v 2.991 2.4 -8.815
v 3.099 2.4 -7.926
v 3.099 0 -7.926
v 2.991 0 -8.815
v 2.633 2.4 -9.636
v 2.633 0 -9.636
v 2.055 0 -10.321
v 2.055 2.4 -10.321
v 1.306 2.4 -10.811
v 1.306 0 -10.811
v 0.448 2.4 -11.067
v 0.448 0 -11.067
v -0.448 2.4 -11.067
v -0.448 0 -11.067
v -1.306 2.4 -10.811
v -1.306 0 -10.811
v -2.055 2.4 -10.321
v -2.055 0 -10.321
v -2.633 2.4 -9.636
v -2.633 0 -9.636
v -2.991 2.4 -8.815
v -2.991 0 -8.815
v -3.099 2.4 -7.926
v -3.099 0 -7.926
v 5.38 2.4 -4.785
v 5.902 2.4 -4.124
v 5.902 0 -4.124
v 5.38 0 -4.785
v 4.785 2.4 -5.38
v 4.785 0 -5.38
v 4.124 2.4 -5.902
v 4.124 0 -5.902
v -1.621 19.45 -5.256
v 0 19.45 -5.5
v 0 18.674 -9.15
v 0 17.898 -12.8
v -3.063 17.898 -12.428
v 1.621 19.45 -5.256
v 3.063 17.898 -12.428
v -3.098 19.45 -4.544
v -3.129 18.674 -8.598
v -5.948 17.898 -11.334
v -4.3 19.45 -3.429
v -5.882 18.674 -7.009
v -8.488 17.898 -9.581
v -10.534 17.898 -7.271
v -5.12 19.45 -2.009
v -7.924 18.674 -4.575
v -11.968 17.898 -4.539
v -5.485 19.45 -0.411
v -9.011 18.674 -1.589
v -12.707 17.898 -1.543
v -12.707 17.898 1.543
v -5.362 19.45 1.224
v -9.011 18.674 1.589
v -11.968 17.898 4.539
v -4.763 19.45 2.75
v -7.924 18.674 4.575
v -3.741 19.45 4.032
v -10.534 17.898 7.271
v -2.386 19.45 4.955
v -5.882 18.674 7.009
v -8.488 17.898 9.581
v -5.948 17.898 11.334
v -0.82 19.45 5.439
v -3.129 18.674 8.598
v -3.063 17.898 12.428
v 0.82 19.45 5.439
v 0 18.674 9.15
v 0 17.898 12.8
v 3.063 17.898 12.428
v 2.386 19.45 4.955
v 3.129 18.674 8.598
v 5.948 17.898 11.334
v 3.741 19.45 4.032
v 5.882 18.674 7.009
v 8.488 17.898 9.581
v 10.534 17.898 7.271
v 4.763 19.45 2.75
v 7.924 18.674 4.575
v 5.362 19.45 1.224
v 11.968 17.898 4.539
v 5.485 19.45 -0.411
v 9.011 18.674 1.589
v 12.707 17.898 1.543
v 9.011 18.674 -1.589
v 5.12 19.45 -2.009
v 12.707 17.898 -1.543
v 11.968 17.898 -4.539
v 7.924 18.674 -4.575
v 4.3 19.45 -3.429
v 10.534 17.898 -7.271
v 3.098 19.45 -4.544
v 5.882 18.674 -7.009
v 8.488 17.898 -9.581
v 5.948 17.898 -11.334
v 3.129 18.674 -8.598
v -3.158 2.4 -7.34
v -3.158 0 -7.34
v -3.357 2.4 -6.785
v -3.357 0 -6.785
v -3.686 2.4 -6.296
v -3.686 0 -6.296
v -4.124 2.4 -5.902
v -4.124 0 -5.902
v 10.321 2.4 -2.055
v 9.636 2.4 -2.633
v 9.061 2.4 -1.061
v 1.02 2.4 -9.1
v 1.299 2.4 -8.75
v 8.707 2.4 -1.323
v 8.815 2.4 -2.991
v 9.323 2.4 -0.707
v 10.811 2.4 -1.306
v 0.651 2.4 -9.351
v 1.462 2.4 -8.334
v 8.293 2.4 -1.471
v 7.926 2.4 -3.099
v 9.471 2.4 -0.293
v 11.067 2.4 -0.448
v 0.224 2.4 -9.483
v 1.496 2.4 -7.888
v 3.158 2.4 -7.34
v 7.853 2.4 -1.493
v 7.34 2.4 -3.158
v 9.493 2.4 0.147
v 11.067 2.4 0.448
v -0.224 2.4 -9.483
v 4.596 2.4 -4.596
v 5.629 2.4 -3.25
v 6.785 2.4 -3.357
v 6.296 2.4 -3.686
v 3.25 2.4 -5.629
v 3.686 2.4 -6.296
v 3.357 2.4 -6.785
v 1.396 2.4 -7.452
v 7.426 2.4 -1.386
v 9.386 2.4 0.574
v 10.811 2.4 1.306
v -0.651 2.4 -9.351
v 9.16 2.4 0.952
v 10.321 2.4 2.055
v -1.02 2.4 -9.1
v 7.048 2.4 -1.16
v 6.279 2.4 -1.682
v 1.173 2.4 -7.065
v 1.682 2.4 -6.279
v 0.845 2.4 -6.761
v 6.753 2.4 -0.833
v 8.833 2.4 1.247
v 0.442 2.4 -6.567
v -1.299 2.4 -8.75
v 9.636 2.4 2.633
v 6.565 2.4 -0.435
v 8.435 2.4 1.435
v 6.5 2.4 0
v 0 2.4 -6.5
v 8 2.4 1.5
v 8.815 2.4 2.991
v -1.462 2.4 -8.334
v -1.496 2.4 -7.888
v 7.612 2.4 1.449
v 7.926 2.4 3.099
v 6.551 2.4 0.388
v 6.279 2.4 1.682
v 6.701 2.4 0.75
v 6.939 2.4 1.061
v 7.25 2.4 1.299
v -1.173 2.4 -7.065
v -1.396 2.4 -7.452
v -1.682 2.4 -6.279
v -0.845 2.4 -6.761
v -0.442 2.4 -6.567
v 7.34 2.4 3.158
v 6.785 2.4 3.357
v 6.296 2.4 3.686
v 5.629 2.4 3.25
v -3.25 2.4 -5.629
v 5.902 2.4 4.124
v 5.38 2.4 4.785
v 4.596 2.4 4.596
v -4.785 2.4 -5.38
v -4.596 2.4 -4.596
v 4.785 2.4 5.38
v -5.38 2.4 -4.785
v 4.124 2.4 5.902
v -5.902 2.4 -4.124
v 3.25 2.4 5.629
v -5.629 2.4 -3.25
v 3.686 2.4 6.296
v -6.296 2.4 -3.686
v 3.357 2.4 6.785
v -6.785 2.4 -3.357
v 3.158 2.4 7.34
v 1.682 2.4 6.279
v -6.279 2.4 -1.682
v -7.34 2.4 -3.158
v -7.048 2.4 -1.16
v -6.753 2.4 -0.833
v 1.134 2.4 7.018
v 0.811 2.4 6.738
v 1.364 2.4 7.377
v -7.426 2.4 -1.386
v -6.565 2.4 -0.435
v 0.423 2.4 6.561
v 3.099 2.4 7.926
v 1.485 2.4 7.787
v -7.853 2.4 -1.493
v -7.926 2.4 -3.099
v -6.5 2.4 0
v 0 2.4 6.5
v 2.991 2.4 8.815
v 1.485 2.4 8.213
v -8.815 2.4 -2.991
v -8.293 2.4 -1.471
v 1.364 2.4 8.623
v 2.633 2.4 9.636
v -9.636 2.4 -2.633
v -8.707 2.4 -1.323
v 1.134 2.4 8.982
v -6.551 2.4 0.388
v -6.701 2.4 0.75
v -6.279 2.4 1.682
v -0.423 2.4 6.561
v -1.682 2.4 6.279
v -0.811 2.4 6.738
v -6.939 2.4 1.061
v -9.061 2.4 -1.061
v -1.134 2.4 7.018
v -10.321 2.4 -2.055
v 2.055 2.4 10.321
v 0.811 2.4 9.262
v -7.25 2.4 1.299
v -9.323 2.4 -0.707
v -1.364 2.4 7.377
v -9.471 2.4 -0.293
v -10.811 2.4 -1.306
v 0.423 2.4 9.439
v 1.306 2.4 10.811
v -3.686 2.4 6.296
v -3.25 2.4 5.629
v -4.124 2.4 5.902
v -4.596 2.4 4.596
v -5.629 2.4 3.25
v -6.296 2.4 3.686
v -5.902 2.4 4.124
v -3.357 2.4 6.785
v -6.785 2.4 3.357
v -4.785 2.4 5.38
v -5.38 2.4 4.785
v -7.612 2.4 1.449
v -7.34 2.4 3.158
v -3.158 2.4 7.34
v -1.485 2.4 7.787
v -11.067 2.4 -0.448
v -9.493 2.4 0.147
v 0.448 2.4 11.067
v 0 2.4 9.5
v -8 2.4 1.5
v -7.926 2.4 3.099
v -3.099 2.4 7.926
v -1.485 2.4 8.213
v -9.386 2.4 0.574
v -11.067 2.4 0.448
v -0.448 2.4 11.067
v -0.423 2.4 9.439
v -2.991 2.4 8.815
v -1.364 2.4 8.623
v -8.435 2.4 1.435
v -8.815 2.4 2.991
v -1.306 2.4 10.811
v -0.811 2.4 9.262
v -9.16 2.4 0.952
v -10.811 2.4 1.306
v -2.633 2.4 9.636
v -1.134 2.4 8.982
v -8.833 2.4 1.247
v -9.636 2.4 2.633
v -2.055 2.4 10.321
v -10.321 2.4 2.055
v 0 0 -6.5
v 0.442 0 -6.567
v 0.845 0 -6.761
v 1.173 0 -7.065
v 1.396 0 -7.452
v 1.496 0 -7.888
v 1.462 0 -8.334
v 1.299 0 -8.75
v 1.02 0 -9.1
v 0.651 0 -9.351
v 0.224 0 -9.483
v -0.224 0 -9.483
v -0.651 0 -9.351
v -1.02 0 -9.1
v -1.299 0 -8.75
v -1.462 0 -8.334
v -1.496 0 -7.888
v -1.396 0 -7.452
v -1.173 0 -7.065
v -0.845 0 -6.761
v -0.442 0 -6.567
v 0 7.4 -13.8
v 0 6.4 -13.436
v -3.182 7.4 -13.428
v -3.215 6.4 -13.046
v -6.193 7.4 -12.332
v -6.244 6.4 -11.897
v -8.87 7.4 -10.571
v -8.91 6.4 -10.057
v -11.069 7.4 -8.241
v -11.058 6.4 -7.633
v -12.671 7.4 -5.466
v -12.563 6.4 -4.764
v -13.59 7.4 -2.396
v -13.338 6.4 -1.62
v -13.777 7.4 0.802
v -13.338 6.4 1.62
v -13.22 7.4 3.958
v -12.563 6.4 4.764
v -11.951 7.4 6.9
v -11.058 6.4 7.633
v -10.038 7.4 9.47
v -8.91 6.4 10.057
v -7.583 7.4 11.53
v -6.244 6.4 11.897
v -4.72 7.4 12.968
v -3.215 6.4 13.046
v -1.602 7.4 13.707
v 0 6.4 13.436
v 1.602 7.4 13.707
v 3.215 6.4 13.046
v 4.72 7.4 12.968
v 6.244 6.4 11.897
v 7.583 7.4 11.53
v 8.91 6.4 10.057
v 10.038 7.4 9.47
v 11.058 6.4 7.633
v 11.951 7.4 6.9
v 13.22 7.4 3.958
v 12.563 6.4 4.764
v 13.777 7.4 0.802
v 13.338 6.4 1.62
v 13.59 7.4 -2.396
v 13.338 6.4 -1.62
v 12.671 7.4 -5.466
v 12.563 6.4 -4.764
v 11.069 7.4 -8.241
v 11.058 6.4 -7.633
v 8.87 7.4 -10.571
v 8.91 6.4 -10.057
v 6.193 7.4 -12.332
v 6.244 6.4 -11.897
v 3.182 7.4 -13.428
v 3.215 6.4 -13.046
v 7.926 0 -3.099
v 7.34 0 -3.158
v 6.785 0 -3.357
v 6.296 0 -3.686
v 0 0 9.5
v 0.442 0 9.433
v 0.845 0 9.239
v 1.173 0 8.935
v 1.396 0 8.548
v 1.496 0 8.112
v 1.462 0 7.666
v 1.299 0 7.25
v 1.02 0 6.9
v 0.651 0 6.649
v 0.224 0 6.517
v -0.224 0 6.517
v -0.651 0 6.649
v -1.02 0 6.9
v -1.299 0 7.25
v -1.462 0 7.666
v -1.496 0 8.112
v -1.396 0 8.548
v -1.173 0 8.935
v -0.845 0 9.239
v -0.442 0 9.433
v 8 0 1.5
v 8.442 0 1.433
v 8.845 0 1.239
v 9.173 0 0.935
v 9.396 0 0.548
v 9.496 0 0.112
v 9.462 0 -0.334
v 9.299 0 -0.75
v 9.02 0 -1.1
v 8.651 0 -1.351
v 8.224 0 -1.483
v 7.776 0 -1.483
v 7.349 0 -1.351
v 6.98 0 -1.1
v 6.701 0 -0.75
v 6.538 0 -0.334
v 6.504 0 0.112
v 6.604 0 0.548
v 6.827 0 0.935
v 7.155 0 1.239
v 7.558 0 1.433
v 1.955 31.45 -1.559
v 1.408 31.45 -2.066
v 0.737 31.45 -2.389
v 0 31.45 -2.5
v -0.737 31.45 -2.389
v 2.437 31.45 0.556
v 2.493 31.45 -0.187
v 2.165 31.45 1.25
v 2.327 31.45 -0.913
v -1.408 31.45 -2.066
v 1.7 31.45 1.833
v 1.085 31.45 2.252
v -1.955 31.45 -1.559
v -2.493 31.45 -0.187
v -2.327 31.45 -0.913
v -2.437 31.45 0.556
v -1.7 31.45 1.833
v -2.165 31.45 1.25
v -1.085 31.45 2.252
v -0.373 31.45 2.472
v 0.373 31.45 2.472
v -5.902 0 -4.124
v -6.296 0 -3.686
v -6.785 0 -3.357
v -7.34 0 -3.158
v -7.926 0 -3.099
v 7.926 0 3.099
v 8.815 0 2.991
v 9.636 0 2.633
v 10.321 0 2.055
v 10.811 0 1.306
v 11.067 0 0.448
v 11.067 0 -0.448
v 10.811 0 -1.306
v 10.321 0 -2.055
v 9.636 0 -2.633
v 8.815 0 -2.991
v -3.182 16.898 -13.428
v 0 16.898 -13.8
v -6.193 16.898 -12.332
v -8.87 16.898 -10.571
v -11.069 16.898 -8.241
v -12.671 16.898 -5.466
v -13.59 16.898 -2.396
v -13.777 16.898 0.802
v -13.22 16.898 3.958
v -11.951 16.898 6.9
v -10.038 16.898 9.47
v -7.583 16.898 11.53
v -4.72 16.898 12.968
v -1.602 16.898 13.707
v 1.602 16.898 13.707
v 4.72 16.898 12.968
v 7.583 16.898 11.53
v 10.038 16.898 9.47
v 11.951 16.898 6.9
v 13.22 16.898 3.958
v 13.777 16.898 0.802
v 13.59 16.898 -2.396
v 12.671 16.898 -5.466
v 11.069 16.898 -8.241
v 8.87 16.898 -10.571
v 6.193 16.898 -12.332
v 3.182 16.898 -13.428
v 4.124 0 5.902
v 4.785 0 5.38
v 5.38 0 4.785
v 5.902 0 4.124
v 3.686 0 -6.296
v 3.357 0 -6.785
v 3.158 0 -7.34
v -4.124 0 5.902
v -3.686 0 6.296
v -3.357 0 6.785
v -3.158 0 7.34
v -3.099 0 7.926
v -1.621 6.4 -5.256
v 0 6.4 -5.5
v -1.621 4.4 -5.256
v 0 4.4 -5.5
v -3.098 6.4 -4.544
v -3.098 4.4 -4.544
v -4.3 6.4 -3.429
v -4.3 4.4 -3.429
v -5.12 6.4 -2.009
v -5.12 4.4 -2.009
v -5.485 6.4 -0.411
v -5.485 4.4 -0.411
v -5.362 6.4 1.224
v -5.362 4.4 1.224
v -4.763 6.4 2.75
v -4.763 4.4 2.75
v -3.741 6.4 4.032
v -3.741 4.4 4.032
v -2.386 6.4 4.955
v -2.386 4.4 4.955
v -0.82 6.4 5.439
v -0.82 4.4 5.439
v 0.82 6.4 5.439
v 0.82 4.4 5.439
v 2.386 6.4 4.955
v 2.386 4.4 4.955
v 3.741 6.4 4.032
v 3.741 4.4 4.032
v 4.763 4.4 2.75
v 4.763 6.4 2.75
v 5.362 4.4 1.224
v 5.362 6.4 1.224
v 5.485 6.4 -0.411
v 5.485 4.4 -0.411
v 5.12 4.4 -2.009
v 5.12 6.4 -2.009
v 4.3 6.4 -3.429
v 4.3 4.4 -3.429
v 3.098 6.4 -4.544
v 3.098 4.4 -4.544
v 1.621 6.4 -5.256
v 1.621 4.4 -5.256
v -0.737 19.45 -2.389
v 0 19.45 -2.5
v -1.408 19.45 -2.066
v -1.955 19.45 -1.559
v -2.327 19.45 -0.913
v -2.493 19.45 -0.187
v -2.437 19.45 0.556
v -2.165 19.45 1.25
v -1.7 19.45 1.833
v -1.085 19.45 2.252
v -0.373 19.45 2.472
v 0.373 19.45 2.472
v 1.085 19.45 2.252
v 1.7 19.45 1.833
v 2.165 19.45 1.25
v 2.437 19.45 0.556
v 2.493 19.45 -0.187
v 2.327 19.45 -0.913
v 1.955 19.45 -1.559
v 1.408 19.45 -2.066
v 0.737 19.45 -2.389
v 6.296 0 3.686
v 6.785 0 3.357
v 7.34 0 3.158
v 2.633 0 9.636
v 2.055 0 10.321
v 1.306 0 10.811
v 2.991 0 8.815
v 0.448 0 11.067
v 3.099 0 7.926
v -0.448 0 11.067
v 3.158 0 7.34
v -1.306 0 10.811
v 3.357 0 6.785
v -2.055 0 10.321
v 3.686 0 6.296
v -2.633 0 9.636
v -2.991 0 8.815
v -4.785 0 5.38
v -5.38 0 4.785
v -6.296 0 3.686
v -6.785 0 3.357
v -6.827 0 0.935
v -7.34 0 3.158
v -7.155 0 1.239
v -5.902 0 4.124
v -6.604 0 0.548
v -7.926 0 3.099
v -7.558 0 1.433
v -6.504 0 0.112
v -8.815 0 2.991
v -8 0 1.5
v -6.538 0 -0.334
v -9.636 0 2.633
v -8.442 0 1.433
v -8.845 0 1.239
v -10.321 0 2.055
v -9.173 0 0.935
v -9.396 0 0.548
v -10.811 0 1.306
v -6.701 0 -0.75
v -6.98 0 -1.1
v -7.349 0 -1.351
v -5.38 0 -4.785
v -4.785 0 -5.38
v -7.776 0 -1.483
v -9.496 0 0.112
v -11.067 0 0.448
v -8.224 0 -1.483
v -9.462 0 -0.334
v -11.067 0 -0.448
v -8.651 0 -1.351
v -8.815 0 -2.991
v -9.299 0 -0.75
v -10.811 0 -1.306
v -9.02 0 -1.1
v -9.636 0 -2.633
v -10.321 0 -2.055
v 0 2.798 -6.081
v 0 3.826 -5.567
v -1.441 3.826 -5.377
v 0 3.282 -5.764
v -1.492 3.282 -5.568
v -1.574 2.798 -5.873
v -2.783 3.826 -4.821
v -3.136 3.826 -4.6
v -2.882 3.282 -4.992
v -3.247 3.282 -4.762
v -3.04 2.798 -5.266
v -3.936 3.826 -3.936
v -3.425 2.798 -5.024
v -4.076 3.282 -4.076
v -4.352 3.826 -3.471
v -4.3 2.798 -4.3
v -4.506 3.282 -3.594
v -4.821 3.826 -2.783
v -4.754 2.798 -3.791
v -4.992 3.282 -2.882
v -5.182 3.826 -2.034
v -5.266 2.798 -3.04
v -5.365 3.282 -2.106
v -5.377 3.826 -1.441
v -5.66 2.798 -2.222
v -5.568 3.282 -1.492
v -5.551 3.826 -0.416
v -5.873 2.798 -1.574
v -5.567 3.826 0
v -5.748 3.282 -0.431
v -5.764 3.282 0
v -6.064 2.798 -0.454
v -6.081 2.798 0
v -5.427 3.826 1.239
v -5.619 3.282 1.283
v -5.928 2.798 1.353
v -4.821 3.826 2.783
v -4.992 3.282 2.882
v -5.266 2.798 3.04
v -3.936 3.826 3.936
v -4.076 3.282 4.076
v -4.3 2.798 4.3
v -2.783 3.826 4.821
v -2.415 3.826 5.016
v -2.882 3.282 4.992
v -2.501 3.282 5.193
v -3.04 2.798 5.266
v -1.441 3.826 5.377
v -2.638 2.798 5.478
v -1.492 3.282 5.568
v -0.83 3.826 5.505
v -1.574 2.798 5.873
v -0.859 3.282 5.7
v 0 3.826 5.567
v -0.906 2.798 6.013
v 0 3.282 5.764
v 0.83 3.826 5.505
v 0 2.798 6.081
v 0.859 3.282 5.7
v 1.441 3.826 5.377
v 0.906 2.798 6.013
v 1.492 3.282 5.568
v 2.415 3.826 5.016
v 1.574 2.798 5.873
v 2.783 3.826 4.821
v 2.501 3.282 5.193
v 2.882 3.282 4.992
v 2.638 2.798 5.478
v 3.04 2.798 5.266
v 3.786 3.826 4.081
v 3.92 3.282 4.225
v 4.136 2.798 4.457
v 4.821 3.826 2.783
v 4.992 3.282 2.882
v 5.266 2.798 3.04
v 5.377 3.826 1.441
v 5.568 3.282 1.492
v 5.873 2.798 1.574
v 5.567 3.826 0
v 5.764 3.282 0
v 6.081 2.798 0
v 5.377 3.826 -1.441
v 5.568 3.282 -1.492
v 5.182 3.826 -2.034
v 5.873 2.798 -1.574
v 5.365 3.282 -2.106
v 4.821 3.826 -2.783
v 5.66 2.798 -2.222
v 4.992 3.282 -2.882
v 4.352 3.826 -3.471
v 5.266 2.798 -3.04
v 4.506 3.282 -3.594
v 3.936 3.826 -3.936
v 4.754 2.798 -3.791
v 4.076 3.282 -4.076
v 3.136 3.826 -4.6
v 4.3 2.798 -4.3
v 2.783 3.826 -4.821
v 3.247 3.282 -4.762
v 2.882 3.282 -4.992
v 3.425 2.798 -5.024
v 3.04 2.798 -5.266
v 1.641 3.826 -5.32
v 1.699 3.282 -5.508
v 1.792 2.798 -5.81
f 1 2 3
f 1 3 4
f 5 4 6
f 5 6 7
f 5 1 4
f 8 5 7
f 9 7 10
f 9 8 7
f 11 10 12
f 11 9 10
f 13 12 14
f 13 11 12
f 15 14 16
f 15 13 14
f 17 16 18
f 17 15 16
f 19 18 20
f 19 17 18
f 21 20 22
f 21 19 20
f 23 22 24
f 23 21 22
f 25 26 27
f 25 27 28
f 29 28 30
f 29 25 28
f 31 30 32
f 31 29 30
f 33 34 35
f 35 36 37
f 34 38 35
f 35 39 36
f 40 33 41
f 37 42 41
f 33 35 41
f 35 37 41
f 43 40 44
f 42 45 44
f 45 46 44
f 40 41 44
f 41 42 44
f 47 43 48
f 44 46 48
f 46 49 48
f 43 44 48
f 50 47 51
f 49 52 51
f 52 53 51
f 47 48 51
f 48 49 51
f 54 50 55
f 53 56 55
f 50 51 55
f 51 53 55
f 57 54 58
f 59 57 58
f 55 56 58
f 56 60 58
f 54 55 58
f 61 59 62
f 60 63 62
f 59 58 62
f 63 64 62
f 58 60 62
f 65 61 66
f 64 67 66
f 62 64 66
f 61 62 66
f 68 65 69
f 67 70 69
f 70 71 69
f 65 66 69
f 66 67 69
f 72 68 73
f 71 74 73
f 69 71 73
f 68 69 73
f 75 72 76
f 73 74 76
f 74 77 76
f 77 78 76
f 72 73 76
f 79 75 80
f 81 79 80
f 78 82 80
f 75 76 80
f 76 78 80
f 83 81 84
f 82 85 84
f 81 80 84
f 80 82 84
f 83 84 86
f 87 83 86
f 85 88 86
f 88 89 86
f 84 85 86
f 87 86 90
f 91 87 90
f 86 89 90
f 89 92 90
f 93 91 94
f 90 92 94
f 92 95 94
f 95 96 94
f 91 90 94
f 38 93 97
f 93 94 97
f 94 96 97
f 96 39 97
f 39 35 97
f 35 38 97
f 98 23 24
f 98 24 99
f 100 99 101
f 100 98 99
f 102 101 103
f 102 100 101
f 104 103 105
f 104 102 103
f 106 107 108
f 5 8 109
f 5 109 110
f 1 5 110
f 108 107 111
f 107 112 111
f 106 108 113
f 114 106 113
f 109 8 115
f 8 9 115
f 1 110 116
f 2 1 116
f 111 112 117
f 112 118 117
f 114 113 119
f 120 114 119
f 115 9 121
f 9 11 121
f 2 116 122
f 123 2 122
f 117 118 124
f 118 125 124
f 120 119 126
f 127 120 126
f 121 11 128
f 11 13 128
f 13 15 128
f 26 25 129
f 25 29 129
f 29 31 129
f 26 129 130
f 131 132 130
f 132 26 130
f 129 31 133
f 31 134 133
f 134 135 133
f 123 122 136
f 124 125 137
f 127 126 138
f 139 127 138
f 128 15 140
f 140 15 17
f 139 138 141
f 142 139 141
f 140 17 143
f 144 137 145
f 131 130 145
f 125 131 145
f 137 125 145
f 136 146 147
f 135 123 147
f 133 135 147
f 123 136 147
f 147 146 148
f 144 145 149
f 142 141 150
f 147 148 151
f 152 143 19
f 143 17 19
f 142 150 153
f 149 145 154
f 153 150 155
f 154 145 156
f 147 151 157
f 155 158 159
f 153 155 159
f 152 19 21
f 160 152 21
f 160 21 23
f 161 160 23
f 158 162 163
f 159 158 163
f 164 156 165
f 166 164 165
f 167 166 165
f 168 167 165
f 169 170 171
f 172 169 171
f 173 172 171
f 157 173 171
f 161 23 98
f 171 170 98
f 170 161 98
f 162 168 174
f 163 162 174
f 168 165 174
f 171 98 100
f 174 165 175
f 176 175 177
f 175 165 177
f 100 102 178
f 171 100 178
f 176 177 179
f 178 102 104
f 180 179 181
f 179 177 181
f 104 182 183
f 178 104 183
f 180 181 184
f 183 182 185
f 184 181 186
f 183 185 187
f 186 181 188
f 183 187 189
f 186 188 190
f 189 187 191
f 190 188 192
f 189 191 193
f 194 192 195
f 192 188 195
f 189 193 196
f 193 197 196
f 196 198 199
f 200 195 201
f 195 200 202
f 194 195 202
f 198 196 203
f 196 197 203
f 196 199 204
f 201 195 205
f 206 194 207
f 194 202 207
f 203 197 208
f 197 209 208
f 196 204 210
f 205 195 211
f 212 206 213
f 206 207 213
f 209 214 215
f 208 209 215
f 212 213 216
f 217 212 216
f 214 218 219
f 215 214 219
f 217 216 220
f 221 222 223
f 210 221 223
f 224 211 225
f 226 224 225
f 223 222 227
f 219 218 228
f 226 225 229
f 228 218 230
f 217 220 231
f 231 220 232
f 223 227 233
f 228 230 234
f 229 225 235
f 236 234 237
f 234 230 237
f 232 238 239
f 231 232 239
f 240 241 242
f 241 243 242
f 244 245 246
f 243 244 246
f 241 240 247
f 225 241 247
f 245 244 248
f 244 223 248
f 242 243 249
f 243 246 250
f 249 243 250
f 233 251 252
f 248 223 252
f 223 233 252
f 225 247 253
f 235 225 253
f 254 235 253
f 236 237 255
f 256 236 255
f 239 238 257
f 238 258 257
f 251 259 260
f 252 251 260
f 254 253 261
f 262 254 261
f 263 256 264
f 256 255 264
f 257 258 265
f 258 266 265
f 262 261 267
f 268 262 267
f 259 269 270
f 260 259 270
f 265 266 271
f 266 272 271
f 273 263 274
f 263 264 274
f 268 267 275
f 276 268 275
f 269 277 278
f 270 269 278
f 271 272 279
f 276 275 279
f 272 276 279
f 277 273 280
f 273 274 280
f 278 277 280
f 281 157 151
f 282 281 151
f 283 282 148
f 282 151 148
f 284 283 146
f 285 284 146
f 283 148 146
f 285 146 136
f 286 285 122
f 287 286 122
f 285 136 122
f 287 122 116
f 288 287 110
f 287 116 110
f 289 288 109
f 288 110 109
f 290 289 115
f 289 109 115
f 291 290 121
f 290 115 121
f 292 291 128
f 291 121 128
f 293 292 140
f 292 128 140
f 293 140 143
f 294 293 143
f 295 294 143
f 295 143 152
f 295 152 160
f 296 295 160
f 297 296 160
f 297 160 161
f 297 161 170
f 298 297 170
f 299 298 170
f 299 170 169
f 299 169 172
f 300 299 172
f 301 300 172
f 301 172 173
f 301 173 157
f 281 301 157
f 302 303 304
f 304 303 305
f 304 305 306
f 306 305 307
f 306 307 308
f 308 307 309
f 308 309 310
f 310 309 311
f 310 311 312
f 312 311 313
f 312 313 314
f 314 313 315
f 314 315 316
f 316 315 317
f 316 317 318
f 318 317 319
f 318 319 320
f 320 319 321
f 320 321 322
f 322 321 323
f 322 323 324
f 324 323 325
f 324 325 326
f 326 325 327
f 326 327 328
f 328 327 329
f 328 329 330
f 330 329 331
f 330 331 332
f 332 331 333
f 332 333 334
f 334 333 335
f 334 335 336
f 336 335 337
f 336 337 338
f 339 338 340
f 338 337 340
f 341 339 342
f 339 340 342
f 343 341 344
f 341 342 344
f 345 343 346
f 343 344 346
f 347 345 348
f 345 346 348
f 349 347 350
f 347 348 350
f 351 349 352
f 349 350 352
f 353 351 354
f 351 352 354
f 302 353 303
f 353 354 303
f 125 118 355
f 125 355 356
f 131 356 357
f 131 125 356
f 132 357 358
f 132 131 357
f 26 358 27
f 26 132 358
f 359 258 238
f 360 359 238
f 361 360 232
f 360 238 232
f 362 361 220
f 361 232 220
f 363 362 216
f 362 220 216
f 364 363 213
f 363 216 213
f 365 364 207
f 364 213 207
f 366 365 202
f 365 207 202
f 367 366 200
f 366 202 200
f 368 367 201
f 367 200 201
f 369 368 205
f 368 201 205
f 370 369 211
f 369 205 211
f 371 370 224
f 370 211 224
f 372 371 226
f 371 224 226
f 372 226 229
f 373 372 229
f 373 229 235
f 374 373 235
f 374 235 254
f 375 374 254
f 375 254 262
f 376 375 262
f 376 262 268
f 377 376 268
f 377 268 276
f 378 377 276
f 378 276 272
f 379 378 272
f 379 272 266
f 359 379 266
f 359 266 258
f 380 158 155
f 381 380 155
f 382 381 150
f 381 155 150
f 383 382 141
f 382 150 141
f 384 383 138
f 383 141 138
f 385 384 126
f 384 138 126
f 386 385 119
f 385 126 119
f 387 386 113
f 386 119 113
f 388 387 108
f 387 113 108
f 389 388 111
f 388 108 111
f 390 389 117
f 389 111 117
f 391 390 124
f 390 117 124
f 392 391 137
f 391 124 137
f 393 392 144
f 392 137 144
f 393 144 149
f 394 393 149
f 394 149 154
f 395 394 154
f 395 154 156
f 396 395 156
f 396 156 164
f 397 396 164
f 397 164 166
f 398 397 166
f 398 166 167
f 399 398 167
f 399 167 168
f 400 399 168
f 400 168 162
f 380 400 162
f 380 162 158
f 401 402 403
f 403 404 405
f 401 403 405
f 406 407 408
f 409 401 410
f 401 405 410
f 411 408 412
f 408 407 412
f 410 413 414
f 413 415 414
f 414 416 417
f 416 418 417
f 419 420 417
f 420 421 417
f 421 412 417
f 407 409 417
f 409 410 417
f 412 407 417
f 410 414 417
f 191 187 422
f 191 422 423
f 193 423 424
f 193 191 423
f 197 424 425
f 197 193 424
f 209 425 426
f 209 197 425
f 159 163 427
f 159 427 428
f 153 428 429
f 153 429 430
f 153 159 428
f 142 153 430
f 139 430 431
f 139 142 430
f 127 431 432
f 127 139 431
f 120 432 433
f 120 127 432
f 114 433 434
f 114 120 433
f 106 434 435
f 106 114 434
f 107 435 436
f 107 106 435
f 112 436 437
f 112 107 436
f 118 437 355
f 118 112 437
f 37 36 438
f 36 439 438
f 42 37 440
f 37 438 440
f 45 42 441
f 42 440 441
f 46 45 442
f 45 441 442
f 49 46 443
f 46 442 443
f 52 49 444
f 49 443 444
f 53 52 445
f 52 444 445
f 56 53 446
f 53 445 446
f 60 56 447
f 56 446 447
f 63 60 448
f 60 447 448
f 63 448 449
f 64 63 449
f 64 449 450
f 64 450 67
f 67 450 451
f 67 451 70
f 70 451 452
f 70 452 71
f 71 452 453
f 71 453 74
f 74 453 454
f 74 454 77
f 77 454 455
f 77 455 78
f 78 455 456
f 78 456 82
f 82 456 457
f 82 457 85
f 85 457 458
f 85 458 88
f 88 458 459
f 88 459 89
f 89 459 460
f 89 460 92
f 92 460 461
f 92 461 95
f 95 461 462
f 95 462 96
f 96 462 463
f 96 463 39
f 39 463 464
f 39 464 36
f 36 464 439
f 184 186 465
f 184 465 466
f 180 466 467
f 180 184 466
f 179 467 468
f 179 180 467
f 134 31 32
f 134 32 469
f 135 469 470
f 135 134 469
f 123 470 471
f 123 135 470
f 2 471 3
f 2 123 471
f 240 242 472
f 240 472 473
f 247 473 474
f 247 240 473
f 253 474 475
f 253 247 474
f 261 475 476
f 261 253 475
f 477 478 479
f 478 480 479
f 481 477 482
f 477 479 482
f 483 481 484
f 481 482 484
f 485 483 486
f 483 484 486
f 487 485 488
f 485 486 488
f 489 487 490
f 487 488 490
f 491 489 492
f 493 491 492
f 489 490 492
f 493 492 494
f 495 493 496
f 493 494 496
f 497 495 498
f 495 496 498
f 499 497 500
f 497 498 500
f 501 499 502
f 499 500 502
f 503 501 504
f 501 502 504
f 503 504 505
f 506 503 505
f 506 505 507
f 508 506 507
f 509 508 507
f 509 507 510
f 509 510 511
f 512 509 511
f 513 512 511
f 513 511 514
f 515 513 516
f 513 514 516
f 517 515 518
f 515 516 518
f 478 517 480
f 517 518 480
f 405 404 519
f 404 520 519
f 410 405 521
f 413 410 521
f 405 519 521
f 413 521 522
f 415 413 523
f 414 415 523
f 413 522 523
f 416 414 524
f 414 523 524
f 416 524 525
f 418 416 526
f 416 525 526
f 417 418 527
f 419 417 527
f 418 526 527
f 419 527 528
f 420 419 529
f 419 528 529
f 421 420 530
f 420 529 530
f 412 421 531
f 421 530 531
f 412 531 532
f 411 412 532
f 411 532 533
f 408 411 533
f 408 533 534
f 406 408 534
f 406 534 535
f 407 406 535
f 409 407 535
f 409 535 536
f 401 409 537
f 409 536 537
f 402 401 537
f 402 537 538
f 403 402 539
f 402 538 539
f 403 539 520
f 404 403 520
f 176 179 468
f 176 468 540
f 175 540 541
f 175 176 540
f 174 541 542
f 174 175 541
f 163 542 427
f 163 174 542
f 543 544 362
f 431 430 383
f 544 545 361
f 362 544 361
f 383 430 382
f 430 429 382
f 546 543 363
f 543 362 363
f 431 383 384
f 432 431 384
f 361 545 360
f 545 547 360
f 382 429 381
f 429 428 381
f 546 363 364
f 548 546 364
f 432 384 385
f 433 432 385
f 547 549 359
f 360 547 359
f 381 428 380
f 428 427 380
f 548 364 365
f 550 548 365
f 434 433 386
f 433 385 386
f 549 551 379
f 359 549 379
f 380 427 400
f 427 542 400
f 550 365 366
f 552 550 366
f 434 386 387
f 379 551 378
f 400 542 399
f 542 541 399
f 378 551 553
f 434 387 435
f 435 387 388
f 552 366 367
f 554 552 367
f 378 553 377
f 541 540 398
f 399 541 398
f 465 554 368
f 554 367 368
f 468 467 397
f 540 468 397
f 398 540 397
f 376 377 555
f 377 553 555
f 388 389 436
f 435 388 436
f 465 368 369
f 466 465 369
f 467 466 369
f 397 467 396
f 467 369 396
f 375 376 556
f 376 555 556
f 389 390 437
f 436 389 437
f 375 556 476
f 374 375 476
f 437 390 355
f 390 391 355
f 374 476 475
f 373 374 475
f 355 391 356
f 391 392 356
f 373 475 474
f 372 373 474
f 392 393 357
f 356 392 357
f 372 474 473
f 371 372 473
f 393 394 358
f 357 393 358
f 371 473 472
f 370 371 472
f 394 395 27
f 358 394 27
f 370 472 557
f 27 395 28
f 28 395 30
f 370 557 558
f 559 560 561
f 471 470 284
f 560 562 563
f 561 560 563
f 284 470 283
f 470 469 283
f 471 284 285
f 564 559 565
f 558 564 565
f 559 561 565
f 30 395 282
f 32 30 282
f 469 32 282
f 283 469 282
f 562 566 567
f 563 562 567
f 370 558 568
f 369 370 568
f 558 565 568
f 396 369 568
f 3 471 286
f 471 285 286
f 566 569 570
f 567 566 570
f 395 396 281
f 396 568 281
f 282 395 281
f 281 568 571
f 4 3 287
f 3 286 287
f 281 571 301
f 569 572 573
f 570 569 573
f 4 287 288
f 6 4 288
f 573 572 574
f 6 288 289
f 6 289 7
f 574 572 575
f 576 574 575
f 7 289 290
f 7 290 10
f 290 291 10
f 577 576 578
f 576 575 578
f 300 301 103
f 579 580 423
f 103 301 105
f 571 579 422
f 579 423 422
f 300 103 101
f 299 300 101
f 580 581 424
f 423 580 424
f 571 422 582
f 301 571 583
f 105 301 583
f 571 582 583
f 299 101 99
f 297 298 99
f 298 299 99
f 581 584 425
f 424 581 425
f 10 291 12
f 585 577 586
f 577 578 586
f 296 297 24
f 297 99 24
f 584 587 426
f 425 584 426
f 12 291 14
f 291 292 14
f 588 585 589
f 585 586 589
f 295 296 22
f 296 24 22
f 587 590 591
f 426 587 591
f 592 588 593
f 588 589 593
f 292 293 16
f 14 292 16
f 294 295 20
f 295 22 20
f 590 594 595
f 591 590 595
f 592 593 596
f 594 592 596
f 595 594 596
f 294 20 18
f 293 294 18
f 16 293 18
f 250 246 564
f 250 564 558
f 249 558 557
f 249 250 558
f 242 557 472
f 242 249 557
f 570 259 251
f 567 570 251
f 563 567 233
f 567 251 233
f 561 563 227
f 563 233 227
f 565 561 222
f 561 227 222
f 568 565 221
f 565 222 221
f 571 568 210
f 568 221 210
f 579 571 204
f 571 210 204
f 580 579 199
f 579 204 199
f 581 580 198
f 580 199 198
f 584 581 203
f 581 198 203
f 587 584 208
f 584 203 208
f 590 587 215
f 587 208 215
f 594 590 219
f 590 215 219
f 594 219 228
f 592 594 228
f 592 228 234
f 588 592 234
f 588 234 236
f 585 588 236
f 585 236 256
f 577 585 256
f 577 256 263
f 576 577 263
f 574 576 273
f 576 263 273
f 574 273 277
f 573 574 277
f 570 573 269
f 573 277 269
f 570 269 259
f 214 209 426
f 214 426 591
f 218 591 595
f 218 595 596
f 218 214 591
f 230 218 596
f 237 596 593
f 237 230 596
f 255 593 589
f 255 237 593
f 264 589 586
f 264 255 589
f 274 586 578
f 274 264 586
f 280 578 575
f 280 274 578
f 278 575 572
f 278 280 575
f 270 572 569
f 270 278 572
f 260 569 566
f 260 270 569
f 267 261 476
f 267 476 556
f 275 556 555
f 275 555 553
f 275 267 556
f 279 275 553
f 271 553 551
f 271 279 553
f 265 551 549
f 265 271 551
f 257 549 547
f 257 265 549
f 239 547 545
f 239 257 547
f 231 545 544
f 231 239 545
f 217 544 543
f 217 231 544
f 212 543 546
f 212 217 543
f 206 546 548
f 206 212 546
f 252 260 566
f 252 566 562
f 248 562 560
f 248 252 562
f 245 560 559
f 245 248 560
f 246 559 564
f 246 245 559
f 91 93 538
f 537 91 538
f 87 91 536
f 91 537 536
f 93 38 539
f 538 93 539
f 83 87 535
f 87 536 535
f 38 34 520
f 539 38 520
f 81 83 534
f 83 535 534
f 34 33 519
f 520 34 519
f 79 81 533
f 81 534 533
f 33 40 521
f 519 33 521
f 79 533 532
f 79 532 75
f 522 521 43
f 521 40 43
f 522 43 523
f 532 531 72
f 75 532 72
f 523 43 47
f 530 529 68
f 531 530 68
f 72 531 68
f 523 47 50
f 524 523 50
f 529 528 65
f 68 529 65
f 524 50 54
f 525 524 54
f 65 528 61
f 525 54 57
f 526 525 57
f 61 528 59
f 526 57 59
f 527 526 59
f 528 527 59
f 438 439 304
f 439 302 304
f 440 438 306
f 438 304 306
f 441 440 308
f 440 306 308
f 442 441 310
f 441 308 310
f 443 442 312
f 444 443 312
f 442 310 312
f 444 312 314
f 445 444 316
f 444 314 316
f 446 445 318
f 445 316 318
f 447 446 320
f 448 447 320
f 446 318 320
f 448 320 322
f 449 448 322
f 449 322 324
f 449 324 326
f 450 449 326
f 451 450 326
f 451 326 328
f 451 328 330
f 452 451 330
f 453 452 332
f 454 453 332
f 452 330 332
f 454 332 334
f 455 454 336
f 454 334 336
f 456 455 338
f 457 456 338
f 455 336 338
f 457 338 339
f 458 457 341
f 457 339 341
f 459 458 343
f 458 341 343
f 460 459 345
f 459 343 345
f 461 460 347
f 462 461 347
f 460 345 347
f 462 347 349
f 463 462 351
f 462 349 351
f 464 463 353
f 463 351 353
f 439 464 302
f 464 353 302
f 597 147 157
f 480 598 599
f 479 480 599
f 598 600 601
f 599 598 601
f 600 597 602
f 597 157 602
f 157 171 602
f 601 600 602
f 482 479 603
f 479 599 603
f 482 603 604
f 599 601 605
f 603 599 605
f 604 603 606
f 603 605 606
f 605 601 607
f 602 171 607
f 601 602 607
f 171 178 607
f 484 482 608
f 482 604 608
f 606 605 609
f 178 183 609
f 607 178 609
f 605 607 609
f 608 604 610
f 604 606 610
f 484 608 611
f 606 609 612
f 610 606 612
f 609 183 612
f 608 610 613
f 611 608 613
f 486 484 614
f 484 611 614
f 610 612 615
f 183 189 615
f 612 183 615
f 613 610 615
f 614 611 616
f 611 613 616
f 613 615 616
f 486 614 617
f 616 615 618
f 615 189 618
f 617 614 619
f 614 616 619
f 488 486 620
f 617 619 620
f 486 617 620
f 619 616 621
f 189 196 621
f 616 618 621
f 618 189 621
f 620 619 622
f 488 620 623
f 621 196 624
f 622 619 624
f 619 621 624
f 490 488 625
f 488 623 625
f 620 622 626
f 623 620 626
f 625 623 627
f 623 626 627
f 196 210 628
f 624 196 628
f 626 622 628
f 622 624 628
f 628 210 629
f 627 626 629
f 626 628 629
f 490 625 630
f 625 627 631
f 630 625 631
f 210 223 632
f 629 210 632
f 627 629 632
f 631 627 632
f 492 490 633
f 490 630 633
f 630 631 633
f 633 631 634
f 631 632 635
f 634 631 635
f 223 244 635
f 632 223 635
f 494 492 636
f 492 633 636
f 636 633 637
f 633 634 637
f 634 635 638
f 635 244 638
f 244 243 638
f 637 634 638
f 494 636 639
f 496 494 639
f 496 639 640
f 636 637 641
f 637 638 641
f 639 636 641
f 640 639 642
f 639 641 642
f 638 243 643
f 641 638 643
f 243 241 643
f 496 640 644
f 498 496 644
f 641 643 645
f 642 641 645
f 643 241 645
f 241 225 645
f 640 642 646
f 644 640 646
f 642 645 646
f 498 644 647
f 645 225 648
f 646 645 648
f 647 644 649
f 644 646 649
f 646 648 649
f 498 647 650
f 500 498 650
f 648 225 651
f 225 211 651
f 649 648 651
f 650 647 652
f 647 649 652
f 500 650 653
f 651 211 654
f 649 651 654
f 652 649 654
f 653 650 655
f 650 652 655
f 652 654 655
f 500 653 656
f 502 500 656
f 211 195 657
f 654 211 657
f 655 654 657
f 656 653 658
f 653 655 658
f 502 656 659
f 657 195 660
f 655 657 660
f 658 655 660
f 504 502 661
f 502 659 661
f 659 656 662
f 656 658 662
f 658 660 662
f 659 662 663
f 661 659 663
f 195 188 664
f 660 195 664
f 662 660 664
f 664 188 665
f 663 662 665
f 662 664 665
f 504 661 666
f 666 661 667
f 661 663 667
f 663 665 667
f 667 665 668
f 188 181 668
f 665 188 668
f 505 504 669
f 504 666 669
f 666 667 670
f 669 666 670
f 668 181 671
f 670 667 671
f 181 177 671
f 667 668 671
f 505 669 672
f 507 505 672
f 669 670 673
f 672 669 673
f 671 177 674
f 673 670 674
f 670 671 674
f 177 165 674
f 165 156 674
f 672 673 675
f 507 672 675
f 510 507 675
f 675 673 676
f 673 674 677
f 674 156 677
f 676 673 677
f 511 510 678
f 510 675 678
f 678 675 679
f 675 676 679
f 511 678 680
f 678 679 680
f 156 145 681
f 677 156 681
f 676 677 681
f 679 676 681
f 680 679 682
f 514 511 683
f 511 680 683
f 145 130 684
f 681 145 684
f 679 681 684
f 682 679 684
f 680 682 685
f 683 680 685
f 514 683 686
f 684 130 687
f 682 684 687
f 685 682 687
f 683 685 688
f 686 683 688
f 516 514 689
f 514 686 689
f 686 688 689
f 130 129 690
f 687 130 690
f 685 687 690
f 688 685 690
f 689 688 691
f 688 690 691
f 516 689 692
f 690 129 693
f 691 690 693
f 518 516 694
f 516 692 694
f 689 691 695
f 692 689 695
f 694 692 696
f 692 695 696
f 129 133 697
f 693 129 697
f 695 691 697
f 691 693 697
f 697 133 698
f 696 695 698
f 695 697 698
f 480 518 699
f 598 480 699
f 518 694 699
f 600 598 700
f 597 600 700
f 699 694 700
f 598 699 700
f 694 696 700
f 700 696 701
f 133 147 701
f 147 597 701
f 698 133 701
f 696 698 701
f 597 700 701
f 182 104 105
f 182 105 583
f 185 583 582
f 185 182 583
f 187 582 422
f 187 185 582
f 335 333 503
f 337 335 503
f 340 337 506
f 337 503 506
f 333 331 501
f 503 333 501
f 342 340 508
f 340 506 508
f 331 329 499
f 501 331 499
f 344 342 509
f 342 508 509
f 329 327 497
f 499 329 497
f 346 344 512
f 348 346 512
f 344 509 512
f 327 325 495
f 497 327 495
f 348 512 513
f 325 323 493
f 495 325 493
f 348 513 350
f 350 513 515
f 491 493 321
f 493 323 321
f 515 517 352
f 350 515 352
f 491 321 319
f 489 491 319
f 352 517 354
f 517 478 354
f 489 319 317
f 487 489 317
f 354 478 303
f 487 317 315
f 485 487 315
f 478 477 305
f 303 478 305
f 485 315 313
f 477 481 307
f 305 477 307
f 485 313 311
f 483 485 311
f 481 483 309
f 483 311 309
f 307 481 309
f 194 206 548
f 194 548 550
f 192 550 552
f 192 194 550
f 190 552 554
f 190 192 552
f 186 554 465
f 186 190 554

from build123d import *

# Parameters (mm, degrees)
SKETCH2_R          = 12
SKETCH2_R_2        = 1.5
CUT_EXTRUDE1_DEPTH = 35.996892719


with BuildPart() as part:
    # Sketch1 → Revolve1 (revolve)
    with BuildSketch(Plane(origin=(0, 0, 0), x_dir=(0, 0, -1), z_dir=(1, 0, 0))):
        with BuildLine():
            Line((0, 0), (0, 31.45))
            Line((0, 31.45), (-2.5, 31.45))
            Line((-2.5, 31.45), (-2.5, 19.45))
            Line((-2.5, 19.45), (-5.5, 19.45))
            Line((-5.5, 19.45), (-12.8, 17.8983371))
            Line((-12.8, 17.8983371), (-13.8, 16.8983371))
            Line((-13.8, 16.8983371), (-13.8, 7.4))
            Line((-13.8, 7.4), (-13.436029766, 6.4))
            Line((-13.436029766, 6.4), (-5.5, 6.4))
            Line((-5.5, 6.4), (-5.5, 4.4))
            ThreePointArc((-5.5, 4.4), (-5.763932023, 3.281966011), (-6.5, 2.4))
            Line((-6.5, 2.4), (-12, 2.4))
            Line((-12, 2.4), (-12, 0))
            Line((-12, 0), (0, 0))
        make_face()
    revolve(axis=Axis((0, 0, 0), (0, 1, 0)))

    # Sketch2 → Cut-Extrude1 (cut, through all)
    # profile 1 of 5: a face of its own
    with BuildSketch(Plane(origin=(0, 2.4, 0), x_dir=(1, 0, 0), z_dir=(0, 1, 0))):
        Circle(SKETCH2_R)
        with BuildLine():
            ThreePointArc((3.09912558, -7.926375), (0, -11.1), (-3.09912558, -7.926375))
            ThreePointArc((-3.09912558, -7.926375), (-3.357154936, -6.785464761), (-4.123836457, -5.90203125))
            ThreePointArc((-4.123836457, -5.90203125), (-5.091168825, -5.091168825), (-5.90203125, -4.123836457))
            ThreePointArc((-5.90203125, -4.123836457), (-6.785464761, -3.357154936), (-7.926375, -3.09912558))
            ThreePointArc((-7.926375, -3.09912558), (-11.1, 0), (-7.926375, 3.09912558))
            ThreePointArc((-7.926375, 3.09912558), (-6.785464761, 3.357154936), (-5.90203125, 4.123836457))
            ThreePointArc((-5.90203125, 4.123836457), (-5.091168825, 5.091168825), (-4.123836457, 5.90203125))
            ThreePointArc((-4.123836457, 5.90203125), (-3.357154936, 6.785464761), (-3.09912558, 7.926375))
            ThreePointArc((-3.09912558, 7.926375), (0, 11.1), (3.09912558, 7.926375))
            ThreePointArc((3.09912558, 7.926375), (3.357154936, 6.785464761), (4.123836457, 5.90203125))
            ThreePointArc((4.123836457, 5.90203125), (5.091168825, 5.091168825), (5.90203125, 4.123836457))
            ThreePointArc((5.90203125, 4.123836457), (6.785464761, 3.357154936), (7.926375, 3.09912558))
            ThreePointArc((7.926375, 3.09912558), (11.1, 0), (7.926375, -3.09912558))
            ThreePointArc((7.926375, -3.09912558), (6.785464761, -3.357154936), (5.90203125, -4.123836457))
            ThreePointArc((5.90203125, -4.123836457), (5.091168825, -5.091168825), (4.123836457, -5.90203125))
            ThreePointArc((4.123836457, -5.90203125), (3.357154936, -6.785464761), (3.09912558, -7.926375))
        make_face(mode=Mode.SUBTRACT)
    # profile 2 of 5: a face of its own
    with BuildSketch(Plane(origin=(0, 2.4, 0), x_dir=(1, 0, 0), z_dir=(0, 1, 0))):
        with Locations((8, 0)):
            Circle(SKETCH2_R_2)
    # profile 3 of 5: a face of its own
    with BuildSketch(Plane(origin=(0, 2.4, 0), x_dir=(1, 0, 0), z_dir=(0, 1, 0))):
        with Locations((0, 8)):
            Circle(SKETCH2_R_2)
    # profile 4 of 5: a face of its own
    with BuildSketch(Plane(origin=(0, 2.4, 0), x_dir=(1, 0, 0), z_dir=(0, 1, 0))):
        with Locations((-8, 0)):
            Circle(SKETCH2_R_2)
    # profile 5 of 5: a face of its own
    with BuildSketch(Plane(origin=(0, 2.4, 0), x_dir=(1, 0, 0), z_dir=(0, 1, 0))):
        with Locations((0, -8)):
            Circle(SKETCH2_R_2)
    extrude(amount=-CUT_EXTRUDE1_DEPTH, mode=Mode.SUBTRACT)


solid = part.part
